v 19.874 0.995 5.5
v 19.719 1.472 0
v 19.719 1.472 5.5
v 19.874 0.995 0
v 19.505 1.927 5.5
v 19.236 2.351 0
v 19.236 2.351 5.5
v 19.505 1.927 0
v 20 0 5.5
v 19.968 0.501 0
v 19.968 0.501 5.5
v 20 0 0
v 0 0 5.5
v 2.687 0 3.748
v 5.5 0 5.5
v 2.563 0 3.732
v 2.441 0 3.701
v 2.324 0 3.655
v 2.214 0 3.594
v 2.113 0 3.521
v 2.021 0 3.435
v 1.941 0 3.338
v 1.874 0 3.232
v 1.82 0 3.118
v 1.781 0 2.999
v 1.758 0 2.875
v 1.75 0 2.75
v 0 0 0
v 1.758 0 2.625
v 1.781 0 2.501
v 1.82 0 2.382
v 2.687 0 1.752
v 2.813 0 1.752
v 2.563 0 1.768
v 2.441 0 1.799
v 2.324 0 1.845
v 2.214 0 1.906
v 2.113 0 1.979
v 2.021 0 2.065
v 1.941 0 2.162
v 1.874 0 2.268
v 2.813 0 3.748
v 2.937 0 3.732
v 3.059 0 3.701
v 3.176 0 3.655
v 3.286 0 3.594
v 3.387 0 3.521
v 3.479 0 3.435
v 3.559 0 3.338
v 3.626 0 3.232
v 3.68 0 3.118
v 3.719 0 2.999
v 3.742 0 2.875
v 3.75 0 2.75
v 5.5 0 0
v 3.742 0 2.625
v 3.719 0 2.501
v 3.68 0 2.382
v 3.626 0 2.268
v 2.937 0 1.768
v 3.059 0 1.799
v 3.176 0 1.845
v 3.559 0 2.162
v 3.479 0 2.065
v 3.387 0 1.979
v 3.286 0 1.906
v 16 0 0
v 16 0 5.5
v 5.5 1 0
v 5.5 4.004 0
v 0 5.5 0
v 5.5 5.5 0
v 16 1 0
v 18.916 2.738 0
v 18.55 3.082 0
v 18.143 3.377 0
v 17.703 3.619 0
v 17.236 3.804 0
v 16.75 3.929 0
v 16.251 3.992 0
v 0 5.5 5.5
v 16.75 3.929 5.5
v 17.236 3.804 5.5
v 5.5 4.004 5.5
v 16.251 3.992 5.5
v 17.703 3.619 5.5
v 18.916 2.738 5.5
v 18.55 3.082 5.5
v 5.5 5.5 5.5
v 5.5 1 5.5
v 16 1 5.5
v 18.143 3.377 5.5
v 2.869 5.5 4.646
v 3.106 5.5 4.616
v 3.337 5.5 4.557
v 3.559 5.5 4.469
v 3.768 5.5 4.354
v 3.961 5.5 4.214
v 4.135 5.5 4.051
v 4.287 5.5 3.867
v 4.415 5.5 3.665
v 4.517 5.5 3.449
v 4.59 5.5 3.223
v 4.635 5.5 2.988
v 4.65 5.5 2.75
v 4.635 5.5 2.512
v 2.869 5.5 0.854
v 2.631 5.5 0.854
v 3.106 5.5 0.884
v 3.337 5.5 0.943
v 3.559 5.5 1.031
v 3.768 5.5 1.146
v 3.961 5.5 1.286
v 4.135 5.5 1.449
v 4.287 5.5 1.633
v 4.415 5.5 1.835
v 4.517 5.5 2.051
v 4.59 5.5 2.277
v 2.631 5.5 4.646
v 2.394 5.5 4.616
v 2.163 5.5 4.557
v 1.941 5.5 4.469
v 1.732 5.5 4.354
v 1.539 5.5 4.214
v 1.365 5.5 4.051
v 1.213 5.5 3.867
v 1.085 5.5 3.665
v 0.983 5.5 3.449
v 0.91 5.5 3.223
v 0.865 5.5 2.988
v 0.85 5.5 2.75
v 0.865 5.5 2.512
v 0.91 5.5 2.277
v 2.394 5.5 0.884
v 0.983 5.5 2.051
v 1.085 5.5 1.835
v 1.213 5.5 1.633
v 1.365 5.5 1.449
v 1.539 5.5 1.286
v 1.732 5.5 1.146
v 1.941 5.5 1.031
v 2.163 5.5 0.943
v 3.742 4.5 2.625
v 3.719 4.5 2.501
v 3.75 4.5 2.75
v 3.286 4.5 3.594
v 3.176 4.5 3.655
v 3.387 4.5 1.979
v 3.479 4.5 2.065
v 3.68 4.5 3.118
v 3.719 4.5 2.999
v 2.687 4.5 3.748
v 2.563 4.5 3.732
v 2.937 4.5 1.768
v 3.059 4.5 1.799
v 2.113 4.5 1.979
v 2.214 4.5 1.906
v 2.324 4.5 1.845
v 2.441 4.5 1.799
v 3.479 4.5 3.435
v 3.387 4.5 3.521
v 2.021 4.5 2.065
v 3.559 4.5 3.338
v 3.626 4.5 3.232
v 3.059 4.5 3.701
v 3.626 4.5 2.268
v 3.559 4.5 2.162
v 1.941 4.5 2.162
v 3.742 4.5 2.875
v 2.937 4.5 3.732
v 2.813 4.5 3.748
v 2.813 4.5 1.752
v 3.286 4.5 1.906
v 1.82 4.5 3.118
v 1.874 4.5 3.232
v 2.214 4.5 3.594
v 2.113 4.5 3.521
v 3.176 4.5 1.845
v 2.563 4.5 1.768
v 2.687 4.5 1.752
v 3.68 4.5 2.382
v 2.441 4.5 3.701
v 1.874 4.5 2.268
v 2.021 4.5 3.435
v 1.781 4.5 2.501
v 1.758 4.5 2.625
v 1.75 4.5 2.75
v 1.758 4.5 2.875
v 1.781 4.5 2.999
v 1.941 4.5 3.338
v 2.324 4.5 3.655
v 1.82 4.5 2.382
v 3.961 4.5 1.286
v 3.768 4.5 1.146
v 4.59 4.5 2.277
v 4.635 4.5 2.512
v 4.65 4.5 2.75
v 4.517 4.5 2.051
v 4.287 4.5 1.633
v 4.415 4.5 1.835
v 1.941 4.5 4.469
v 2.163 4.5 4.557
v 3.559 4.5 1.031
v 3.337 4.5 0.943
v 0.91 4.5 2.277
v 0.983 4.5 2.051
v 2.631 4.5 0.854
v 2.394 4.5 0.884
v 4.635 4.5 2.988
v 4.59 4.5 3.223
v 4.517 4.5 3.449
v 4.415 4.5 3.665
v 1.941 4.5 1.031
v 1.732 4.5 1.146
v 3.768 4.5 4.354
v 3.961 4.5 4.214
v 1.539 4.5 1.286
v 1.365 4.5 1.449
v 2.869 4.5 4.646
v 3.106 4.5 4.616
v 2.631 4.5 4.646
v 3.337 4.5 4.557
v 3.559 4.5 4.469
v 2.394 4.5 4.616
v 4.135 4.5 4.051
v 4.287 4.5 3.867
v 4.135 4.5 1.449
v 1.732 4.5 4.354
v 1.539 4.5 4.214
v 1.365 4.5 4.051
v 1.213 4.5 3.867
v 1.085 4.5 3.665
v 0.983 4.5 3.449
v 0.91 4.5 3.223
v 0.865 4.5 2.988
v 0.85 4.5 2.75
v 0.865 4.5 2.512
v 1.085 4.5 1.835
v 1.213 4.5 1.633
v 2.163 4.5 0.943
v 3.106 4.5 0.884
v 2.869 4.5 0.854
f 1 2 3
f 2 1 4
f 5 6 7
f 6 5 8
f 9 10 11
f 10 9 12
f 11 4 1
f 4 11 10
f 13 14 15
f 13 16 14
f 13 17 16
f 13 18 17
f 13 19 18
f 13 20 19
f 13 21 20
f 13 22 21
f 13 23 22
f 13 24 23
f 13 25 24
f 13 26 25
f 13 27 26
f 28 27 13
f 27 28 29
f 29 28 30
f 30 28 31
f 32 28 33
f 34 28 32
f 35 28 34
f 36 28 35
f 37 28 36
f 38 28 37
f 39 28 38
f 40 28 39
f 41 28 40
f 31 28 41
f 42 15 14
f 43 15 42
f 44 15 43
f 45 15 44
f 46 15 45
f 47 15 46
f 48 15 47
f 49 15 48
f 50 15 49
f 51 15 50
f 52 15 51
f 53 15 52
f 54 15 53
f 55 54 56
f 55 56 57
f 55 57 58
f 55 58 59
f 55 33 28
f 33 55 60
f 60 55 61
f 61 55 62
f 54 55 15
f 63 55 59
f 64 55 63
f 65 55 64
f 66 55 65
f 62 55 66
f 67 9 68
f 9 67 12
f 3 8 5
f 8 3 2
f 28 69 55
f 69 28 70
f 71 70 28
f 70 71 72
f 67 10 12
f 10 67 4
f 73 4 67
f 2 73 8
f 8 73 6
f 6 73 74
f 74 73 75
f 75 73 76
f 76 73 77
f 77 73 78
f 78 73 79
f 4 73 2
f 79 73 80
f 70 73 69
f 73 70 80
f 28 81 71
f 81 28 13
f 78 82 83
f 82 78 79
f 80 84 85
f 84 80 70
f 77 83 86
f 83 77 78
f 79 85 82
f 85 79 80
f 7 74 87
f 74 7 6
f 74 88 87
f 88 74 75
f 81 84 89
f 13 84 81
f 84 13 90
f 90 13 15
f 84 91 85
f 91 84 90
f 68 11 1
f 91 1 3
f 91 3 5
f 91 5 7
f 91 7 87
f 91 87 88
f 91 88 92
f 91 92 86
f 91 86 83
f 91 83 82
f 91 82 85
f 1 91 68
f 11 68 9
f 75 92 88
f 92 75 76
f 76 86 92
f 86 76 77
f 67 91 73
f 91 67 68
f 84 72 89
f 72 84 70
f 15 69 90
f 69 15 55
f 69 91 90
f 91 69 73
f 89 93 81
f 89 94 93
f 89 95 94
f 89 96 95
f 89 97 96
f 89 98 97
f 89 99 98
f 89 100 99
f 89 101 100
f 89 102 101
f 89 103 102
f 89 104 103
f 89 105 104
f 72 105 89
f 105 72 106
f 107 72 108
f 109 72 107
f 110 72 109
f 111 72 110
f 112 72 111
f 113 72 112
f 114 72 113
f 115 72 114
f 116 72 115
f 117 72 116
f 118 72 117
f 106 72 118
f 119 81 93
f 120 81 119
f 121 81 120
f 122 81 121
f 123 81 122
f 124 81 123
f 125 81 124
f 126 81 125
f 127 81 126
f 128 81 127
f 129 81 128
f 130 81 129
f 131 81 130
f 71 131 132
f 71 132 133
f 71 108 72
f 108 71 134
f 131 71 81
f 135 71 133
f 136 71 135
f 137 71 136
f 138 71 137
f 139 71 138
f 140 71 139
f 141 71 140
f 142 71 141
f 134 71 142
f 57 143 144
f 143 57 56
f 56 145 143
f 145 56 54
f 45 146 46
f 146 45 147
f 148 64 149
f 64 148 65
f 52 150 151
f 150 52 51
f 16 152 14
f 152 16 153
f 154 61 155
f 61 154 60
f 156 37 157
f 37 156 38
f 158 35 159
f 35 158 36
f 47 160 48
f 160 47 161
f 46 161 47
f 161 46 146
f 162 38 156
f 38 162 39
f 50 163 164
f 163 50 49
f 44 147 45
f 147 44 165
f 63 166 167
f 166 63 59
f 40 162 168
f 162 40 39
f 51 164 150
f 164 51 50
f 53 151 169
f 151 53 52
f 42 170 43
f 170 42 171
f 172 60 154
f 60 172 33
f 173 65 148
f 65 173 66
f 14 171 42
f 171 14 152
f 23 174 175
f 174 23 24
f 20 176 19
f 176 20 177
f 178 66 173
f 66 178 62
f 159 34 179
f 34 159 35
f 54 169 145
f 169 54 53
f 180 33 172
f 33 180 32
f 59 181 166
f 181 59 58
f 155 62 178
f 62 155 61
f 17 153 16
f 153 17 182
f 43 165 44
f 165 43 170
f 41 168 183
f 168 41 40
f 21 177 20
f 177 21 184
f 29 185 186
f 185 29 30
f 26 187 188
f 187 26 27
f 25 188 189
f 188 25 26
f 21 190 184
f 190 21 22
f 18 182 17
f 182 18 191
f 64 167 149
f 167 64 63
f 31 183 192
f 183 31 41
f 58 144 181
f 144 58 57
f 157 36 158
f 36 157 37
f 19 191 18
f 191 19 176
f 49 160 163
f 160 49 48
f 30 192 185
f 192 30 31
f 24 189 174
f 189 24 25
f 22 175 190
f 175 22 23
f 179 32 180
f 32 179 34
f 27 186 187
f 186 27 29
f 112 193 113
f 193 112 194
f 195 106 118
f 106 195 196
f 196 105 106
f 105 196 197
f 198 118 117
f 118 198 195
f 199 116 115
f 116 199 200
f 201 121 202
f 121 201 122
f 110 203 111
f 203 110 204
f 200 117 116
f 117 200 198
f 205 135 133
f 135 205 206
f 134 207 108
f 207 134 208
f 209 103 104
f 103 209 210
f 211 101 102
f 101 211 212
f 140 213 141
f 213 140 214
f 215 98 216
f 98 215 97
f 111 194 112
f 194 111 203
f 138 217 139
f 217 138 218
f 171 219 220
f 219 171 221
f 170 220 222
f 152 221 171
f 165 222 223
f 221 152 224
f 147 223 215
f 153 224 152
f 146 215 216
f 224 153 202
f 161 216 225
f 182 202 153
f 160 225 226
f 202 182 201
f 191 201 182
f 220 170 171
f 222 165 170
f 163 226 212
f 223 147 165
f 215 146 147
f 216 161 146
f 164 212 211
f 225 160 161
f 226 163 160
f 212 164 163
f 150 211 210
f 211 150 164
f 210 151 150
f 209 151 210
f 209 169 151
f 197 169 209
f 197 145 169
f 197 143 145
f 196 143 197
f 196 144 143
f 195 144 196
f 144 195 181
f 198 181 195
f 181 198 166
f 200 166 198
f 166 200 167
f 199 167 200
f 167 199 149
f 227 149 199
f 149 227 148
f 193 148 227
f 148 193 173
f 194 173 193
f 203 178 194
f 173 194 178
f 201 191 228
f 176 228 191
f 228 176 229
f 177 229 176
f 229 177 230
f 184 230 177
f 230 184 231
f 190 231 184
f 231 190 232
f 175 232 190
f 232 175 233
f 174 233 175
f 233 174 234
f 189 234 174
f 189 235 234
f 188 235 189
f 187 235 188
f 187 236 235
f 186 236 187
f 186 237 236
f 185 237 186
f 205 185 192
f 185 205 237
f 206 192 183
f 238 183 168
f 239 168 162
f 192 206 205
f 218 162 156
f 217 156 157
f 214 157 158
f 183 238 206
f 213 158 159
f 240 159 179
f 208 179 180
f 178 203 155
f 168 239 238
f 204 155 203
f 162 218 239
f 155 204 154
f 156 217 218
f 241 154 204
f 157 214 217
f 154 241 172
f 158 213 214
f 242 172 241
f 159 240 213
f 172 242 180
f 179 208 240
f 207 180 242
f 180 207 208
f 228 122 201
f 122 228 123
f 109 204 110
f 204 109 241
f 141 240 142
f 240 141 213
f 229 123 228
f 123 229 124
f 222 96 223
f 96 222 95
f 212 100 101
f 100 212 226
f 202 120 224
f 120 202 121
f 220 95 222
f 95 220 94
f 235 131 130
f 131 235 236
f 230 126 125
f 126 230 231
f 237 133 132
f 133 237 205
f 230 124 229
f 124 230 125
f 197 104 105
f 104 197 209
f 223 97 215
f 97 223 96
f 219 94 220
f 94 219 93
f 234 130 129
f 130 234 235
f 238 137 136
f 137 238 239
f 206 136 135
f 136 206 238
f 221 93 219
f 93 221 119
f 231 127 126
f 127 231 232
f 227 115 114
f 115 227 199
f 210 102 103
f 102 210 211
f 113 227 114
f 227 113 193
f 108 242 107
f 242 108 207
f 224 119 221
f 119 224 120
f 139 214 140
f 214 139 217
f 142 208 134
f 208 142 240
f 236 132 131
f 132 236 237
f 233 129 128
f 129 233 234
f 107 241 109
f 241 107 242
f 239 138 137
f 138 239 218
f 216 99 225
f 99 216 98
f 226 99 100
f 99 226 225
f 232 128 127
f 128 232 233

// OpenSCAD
/**
 * Cable holder clips.
 *
 * Made by coredump hackerspace in Rapperswil, Switzerland.
 * CC BY-SA 3.0.
 */
corner_radius = 4;
thickness = 5.5;
base_width = 20;
nail_radius = 1;
nail_head_depth = 1;
nail_head_radius = 1.9;
led_strip_width = 10.5;
led_strip_height = 1;

module base_raw() {
	hull() {
		translate([0, - corner_radius])
			circle(r=0.01, $fn=50);
		translate([0, corner_radius])
			circle(r=0.01, $fn=50);
		translate([base_width - corner_radius, 0])
			circle(r=corner_radius, $fn=50);
	};
};

module led_strip() {
	translate([thickness, 0, 0])
		cube([led_strip_width, led_strip_height, thickness]);
};

// Covers the LED strip
module base() {
	difference() {
		linear_extrude(thickness) intersection() {
			base_raw();
			square([999, 999]);
		};
		led_strip();
	};
};

// Nail goes in here
module nail_socket() {
	difference() {
		cube([thickness, thickness, thickness]);
	};
};

// The nail
module nail() {
	union() {
		// Nail
		rotate(a=[270, 0, 0])
			translate([thickness/2, -thickness/2])
			cylinder(h=thickness + 10, r=nail_radius, $fn=50);
		// Nail head
		translate([0, thickness - nail_head_depth])
			rotate(a=[270, 0, 0])
			translate([thickness/2, -thickness/2])
			cylinder(h=nail_head_depth, r=nail_head_radius, $fn=50);
	};
};

// This is the final stuff
difference() {
	union() {
		base();
		nail_socket();
	};
	nail();
}
